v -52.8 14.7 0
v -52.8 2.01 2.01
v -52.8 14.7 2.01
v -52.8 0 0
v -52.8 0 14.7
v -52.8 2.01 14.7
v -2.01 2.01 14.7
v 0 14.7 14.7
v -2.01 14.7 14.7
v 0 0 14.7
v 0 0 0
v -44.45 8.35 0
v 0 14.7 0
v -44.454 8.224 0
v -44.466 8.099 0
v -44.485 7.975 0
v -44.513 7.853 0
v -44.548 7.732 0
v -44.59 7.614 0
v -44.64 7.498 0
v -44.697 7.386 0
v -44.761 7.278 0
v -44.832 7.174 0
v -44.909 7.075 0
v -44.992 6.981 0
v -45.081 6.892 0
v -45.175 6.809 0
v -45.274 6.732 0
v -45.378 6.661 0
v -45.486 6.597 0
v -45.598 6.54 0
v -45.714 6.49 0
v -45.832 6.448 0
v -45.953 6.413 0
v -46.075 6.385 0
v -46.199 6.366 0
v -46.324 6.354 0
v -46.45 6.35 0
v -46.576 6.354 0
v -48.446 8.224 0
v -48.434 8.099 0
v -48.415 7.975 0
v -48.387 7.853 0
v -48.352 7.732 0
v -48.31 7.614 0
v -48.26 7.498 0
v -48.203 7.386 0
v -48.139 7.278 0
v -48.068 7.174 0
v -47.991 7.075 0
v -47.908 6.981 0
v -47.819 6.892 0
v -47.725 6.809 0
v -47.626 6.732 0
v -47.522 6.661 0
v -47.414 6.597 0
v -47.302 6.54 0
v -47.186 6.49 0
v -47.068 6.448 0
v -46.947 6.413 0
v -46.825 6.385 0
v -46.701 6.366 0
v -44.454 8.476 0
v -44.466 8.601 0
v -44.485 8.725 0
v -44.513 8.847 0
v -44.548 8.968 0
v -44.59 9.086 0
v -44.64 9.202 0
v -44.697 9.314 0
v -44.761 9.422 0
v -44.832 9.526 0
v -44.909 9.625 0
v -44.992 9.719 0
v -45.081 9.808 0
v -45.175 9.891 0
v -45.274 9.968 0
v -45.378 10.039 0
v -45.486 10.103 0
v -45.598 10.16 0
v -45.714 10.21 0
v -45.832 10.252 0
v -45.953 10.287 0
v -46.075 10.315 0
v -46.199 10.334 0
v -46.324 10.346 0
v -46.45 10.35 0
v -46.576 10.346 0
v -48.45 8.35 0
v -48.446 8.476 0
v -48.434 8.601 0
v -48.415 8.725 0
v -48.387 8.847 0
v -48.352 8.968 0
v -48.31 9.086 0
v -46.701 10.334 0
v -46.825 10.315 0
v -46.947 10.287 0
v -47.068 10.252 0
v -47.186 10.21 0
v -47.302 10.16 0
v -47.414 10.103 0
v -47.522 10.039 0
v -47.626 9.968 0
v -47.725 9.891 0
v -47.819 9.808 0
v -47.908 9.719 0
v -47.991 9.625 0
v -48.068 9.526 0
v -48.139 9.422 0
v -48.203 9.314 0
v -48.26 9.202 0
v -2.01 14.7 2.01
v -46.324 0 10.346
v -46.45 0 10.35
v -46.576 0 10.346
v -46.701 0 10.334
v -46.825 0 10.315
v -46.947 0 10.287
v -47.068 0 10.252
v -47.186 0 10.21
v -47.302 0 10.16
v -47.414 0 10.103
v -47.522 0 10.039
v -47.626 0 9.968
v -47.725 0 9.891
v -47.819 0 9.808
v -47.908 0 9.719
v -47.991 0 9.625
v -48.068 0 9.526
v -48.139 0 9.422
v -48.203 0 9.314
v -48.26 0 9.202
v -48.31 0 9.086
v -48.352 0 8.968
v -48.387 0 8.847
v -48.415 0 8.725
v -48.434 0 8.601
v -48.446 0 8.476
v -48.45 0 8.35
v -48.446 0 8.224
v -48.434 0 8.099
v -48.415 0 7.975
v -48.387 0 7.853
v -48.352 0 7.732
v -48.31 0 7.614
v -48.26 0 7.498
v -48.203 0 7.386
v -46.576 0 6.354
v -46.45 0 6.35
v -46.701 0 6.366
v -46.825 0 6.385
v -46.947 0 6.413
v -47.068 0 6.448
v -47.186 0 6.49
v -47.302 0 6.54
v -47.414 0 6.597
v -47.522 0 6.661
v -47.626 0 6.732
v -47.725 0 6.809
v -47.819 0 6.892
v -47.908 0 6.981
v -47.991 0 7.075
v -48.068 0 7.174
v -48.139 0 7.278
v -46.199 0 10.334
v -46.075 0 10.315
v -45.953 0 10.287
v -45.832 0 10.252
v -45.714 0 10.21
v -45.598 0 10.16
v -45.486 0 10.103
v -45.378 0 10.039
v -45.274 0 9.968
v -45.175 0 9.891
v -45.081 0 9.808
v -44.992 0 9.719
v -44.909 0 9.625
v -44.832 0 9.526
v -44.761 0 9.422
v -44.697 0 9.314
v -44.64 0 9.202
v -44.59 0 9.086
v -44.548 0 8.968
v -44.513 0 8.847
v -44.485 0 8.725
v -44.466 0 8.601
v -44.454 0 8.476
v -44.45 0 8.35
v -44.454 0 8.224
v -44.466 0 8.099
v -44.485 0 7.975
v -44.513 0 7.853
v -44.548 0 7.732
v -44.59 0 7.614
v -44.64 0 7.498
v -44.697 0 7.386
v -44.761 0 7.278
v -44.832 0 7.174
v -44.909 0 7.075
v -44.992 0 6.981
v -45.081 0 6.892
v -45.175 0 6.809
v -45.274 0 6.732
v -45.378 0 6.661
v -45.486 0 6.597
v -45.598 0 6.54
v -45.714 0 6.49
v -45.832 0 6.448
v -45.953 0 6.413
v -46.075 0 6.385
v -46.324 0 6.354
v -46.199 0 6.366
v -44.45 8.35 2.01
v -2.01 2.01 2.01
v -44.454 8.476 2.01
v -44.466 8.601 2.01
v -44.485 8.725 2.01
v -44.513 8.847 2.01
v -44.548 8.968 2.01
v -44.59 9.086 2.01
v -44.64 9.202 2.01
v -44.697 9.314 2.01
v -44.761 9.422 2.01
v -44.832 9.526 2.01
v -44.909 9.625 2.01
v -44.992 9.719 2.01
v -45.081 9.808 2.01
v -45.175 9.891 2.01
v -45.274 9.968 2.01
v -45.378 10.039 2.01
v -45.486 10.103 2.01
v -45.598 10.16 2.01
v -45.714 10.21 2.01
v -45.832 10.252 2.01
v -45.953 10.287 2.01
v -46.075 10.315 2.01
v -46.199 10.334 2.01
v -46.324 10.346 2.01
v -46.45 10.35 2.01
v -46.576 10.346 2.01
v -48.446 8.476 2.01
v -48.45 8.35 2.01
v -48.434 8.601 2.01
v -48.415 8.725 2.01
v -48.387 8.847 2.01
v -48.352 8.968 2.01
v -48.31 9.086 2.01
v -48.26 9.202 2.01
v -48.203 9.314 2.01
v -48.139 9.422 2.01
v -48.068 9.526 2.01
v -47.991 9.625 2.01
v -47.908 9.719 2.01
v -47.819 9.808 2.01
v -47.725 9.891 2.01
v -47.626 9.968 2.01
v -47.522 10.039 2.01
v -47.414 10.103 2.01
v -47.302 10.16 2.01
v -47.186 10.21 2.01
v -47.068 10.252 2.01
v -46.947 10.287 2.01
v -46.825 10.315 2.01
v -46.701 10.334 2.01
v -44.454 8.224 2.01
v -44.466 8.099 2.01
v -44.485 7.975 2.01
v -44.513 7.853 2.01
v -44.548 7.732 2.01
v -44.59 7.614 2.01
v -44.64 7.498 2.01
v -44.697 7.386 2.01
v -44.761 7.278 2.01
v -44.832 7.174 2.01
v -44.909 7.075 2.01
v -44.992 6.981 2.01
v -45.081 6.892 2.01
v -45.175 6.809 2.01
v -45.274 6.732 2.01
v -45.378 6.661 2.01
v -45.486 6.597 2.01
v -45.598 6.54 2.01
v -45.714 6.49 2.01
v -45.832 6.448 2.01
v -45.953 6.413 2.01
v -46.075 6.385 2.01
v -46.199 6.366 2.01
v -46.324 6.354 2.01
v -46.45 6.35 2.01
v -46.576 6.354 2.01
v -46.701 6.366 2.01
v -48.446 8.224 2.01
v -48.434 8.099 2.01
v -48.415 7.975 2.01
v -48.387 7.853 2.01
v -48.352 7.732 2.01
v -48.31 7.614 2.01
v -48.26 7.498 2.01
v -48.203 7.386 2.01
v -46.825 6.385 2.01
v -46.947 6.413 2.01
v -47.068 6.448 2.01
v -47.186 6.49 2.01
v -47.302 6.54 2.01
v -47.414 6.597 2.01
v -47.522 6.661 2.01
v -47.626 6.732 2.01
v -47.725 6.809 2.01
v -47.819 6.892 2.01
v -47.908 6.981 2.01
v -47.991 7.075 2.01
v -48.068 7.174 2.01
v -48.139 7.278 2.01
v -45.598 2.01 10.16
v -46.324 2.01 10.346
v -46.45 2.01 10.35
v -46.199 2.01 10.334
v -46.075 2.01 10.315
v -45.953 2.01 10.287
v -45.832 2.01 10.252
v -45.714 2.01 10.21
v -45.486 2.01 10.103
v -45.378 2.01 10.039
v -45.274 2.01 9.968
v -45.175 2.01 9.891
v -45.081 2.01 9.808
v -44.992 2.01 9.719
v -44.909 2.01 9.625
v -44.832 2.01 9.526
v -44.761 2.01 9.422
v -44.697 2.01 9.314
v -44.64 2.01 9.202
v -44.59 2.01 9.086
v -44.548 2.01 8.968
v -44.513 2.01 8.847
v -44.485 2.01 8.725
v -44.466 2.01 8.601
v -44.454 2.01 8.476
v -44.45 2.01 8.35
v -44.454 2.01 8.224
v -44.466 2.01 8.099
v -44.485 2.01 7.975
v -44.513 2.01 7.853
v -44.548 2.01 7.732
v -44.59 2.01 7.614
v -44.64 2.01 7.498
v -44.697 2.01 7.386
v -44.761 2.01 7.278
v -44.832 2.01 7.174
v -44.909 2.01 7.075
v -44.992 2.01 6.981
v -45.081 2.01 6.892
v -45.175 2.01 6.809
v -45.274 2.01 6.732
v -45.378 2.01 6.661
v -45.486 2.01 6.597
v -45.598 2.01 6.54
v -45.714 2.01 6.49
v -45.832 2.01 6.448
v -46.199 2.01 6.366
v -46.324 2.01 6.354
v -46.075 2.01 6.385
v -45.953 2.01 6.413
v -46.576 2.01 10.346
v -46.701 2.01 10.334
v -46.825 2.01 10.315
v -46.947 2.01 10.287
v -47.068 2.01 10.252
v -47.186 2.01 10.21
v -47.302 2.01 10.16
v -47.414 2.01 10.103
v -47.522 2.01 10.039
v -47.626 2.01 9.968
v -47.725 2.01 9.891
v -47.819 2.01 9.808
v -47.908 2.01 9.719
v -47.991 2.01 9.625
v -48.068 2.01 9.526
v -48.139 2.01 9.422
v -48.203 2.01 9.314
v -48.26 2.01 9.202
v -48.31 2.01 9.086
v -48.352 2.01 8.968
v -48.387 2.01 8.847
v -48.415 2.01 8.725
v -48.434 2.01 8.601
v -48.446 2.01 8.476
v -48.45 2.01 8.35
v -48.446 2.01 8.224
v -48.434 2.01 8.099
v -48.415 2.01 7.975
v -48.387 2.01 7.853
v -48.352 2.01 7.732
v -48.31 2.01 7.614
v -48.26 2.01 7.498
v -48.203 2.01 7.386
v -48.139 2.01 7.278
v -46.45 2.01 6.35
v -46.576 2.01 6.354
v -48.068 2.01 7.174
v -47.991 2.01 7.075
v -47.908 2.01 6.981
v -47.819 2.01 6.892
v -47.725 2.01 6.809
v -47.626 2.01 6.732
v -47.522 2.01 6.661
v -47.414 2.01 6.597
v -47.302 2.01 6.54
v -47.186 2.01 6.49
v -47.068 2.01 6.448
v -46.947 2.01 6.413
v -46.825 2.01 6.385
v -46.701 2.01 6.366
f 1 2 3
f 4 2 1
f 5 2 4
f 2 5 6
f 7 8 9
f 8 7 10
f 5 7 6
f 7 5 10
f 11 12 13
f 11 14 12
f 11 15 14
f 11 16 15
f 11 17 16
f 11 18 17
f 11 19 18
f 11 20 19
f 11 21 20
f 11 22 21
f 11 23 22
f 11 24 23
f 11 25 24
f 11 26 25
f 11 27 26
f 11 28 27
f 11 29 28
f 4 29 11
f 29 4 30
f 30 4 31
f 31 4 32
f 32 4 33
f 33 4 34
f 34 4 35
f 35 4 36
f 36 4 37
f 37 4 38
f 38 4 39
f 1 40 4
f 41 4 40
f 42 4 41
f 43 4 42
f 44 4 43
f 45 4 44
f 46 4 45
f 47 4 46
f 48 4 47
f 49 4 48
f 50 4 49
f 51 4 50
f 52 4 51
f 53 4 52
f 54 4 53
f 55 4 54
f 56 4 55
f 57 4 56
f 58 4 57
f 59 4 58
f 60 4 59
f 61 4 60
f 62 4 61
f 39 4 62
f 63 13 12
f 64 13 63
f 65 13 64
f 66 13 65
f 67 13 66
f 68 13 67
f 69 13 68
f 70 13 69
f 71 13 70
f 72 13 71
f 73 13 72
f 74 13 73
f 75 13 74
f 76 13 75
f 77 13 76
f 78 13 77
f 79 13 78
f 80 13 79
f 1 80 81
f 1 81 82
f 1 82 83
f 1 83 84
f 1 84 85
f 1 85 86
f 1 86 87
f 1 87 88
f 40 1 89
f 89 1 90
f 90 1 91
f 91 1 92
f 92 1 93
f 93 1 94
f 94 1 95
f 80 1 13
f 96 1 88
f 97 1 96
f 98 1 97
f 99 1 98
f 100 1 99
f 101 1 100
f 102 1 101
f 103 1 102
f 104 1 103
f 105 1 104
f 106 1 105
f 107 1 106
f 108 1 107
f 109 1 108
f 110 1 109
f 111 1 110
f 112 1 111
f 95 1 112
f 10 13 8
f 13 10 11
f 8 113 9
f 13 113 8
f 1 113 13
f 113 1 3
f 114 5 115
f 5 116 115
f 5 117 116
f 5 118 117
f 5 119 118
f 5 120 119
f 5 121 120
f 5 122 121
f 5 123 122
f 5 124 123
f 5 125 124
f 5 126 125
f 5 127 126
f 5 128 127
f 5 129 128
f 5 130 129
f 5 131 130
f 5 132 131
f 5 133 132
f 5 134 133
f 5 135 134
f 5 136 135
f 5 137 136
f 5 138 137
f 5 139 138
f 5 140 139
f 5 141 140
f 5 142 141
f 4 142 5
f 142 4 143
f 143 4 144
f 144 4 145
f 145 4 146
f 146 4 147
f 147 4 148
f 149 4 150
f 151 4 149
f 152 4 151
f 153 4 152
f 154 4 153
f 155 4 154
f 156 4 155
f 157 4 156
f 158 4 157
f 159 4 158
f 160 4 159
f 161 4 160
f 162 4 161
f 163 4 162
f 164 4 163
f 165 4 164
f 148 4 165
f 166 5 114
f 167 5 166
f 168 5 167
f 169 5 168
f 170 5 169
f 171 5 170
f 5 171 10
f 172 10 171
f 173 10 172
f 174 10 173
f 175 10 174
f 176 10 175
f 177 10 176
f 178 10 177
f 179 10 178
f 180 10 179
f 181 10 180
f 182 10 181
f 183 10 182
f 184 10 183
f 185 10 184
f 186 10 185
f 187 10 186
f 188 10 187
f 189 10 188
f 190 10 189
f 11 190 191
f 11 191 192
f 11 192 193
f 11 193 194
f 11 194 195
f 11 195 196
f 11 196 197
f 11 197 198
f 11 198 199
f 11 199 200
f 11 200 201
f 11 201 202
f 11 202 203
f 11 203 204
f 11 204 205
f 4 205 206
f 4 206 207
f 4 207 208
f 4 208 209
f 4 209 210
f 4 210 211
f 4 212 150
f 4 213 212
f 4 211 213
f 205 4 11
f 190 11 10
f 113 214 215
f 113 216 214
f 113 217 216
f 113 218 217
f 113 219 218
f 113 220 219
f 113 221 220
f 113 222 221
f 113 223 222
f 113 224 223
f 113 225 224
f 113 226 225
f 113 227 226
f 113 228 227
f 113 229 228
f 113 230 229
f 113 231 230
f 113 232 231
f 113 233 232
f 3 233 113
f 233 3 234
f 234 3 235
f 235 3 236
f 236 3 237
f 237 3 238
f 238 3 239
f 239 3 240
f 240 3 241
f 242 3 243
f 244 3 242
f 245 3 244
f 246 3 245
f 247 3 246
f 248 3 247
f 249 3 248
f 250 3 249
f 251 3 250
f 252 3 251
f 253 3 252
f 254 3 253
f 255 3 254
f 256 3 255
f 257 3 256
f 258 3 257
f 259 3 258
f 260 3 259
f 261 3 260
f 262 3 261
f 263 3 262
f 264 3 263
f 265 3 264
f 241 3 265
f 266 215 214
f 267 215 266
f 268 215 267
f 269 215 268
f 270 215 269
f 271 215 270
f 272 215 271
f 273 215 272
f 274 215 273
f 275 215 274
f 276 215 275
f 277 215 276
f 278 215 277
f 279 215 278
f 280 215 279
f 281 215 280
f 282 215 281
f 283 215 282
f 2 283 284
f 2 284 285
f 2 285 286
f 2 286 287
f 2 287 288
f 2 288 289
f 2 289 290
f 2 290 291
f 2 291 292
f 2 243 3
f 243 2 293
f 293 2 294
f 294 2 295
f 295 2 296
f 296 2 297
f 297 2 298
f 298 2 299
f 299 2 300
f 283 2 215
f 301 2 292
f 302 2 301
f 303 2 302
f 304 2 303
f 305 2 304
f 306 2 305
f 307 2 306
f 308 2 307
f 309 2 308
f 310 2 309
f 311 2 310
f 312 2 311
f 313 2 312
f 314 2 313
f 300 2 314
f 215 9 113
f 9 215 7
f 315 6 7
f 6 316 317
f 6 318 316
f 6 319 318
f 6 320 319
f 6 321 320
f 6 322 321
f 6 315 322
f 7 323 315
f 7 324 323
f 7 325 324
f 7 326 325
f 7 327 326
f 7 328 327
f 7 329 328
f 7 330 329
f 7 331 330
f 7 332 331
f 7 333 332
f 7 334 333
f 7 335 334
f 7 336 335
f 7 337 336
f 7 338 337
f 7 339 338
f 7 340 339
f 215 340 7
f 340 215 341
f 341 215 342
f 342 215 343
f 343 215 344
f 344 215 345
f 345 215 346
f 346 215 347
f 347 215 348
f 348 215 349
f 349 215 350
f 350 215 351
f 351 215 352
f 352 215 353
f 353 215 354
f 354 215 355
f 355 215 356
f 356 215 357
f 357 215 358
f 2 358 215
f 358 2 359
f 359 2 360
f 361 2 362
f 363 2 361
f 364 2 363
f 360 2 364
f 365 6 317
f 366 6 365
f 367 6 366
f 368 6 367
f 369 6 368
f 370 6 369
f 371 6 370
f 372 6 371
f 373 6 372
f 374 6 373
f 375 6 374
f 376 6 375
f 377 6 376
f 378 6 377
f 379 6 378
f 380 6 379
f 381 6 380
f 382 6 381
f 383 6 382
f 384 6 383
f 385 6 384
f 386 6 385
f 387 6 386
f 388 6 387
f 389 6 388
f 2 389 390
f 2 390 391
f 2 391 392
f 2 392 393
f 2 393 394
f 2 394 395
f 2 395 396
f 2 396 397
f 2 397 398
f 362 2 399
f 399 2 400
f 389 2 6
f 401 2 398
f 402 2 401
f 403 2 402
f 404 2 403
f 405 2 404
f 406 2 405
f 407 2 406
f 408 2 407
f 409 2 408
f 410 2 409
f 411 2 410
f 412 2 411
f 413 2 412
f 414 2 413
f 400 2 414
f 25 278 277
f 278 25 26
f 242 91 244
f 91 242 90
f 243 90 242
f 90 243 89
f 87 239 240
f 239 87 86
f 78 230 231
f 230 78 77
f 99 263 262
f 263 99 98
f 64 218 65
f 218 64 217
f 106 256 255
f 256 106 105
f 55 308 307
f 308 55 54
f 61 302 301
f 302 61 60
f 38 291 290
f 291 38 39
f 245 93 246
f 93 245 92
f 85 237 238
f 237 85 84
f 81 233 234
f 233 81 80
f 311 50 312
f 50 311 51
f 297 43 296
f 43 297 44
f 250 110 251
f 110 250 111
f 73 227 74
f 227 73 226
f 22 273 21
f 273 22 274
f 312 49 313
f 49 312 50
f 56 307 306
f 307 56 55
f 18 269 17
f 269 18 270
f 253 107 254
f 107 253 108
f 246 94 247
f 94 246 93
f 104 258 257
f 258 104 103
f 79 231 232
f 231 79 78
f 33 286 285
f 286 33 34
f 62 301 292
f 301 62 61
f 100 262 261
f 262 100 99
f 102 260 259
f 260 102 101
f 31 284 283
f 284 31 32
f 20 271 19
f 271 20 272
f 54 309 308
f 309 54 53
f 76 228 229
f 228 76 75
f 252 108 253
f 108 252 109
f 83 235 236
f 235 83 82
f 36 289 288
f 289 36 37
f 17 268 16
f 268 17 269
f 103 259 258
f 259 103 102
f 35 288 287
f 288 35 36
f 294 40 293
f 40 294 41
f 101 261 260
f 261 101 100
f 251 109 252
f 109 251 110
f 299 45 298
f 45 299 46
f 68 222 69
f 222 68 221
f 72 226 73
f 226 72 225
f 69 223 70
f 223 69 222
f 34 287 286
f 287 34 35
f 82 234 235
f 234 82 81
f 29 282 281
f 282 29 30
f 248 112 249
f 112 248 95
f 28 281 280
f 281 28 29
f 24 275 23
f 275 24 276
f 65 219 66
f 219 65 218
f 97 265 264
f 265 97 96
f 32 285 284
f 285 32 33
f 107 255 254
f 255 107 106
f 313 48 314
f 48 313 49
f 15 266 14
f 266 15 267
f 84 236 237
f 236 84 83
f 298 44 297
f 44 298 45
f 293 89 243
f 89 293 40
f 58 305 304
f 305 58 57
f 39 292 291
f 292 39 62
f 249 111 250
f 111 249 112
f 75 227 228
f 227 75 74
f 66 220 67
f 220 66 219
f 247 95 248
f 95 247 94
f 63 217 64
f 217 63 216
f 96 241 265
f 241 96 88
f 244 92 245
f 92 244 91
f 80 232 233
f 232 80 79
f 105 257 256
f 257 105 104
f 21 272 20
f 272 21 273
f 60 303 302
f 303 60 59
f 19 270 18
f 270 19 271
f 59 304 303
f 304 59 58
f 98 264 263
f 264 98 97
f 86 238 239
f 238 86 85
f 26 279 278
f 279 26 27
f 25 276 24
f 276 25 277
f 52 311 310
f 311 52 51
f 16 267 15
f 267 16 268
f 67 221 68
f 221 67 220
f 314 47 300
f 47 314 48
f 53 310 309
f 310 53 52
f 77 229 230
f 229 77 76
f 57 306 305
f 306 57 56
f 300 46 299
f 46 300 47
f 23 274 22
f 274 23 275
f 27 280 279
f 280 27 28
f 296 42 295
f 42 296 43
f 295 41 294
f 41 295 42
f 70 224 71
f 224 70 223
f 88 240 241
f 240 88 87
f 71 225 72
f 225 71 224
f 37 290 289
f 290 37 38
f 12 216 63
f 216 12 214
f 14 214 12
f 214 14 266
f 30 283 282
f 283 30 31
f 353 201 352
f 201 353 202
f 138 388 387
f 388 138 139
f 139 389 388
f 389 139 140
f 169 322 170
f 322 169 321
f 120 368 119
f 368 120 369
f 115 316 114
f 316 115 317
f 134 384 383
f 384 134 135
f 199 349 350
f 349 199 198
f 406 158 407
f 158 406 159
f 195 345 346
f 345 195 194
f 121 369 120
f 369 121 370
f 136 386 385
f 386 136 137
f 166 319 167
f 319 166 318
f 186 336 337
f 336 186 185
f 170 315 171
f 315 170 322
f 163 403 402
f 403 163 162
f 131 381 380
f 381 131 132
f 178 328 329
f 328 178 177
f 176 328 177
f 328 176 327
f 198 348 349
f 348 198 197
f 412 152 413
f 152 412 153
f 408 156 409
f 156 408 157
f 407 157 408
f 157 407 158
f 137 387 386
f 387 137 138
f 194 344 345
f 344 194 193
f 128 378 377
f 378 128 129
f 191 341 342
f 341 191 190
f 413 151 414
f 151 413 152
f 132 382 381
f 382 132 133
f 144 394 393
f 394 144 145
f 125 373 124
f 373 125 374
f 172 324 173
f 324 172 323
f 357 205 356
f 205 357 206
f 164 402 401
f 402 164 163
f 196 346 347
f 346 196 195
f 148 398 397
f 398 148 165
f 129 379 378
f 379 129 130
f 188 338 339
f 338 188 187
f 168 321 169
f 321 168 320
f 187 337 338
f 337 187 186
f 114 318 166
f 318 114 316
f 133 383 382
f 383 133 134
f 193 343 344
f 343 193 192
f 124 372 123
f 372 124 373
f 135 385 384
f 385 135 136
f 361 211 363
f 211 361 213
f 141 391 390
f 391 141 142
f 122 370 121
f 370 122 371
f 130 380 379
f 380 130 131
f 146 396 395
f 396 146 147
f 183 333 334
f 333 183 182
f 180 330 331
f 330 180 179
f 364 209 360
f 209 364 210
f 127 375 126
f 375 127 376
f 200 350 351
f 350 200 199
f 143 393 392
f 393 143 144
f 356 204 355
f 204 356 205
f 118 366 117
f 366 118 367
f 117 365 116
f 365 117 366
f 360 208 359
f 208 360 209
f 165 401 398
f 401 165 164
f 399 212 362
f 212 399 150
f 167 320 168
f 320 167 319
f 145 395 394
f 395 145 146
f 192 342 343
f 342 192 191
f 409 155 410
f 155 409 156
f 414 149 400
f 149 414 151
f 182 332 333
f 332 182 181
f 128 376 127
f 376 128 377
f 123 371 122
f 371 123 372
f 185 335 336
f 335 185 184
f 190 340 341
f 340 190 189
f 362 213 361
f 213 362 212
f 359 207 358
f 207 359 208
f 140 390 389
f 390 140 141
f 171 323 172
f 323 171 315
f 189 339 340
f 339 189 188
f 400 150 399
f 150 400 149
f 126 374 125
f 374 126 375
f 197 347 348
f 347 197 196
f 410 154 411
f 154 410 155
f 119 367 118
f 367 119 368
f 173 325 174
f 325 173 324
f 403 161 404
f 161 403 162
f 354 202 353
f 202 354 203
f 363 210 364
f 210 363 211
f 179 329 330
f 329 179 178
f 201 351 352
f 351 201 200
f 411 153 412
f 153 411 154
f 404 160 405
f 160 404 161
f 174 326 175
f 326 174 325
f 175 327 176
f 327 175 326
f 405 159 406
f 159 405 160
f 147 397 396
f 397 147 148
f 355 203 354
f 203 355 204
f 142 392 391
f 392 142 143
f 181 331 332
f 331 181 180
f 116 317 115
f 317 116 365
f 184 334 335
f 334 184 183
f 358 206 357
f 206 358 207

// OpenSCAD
function in_to_mm(in) = in * 25.4;

hf = in_to_mm(1/2);
wall = 2;
rerr = 0.01;
rerr2 = rerr*2;

// translate([0, hf+wall + 1, 0])
// difference() {
//   cube([hf+wall, hf, hf+wall]);
//
//   translate([wall+rerr, -rerr, wall+rerr])
//   cube([hf+rerr2, hf+rerr2, hf+rerr2]);
//
//   translate([hf/2 + wall, (hf)/2, 0])
//   cylinder(r=2, h=10, center=true, $fn=100);
// }

offset = in_to_mm(2);
w = offset + wall;
d = hf + wall;
h = hf + wall;

mirror([1, 0, 0])
difference() {
  cube([w, d, h]);

  translate([wall+rerr, wall+rerr, wall+rerr])
  cube([w, d, h]);

  translate([w - hf/2, d - hf/2, 0])
  cylinder(r=2, h=10, center=true, $fn=100);

  rotate([90, 0, 0])
  translate([w - hf/2, d - hf/2, 0])
  cylinder(r=2, h=10, center=true, $fn=100);
}
